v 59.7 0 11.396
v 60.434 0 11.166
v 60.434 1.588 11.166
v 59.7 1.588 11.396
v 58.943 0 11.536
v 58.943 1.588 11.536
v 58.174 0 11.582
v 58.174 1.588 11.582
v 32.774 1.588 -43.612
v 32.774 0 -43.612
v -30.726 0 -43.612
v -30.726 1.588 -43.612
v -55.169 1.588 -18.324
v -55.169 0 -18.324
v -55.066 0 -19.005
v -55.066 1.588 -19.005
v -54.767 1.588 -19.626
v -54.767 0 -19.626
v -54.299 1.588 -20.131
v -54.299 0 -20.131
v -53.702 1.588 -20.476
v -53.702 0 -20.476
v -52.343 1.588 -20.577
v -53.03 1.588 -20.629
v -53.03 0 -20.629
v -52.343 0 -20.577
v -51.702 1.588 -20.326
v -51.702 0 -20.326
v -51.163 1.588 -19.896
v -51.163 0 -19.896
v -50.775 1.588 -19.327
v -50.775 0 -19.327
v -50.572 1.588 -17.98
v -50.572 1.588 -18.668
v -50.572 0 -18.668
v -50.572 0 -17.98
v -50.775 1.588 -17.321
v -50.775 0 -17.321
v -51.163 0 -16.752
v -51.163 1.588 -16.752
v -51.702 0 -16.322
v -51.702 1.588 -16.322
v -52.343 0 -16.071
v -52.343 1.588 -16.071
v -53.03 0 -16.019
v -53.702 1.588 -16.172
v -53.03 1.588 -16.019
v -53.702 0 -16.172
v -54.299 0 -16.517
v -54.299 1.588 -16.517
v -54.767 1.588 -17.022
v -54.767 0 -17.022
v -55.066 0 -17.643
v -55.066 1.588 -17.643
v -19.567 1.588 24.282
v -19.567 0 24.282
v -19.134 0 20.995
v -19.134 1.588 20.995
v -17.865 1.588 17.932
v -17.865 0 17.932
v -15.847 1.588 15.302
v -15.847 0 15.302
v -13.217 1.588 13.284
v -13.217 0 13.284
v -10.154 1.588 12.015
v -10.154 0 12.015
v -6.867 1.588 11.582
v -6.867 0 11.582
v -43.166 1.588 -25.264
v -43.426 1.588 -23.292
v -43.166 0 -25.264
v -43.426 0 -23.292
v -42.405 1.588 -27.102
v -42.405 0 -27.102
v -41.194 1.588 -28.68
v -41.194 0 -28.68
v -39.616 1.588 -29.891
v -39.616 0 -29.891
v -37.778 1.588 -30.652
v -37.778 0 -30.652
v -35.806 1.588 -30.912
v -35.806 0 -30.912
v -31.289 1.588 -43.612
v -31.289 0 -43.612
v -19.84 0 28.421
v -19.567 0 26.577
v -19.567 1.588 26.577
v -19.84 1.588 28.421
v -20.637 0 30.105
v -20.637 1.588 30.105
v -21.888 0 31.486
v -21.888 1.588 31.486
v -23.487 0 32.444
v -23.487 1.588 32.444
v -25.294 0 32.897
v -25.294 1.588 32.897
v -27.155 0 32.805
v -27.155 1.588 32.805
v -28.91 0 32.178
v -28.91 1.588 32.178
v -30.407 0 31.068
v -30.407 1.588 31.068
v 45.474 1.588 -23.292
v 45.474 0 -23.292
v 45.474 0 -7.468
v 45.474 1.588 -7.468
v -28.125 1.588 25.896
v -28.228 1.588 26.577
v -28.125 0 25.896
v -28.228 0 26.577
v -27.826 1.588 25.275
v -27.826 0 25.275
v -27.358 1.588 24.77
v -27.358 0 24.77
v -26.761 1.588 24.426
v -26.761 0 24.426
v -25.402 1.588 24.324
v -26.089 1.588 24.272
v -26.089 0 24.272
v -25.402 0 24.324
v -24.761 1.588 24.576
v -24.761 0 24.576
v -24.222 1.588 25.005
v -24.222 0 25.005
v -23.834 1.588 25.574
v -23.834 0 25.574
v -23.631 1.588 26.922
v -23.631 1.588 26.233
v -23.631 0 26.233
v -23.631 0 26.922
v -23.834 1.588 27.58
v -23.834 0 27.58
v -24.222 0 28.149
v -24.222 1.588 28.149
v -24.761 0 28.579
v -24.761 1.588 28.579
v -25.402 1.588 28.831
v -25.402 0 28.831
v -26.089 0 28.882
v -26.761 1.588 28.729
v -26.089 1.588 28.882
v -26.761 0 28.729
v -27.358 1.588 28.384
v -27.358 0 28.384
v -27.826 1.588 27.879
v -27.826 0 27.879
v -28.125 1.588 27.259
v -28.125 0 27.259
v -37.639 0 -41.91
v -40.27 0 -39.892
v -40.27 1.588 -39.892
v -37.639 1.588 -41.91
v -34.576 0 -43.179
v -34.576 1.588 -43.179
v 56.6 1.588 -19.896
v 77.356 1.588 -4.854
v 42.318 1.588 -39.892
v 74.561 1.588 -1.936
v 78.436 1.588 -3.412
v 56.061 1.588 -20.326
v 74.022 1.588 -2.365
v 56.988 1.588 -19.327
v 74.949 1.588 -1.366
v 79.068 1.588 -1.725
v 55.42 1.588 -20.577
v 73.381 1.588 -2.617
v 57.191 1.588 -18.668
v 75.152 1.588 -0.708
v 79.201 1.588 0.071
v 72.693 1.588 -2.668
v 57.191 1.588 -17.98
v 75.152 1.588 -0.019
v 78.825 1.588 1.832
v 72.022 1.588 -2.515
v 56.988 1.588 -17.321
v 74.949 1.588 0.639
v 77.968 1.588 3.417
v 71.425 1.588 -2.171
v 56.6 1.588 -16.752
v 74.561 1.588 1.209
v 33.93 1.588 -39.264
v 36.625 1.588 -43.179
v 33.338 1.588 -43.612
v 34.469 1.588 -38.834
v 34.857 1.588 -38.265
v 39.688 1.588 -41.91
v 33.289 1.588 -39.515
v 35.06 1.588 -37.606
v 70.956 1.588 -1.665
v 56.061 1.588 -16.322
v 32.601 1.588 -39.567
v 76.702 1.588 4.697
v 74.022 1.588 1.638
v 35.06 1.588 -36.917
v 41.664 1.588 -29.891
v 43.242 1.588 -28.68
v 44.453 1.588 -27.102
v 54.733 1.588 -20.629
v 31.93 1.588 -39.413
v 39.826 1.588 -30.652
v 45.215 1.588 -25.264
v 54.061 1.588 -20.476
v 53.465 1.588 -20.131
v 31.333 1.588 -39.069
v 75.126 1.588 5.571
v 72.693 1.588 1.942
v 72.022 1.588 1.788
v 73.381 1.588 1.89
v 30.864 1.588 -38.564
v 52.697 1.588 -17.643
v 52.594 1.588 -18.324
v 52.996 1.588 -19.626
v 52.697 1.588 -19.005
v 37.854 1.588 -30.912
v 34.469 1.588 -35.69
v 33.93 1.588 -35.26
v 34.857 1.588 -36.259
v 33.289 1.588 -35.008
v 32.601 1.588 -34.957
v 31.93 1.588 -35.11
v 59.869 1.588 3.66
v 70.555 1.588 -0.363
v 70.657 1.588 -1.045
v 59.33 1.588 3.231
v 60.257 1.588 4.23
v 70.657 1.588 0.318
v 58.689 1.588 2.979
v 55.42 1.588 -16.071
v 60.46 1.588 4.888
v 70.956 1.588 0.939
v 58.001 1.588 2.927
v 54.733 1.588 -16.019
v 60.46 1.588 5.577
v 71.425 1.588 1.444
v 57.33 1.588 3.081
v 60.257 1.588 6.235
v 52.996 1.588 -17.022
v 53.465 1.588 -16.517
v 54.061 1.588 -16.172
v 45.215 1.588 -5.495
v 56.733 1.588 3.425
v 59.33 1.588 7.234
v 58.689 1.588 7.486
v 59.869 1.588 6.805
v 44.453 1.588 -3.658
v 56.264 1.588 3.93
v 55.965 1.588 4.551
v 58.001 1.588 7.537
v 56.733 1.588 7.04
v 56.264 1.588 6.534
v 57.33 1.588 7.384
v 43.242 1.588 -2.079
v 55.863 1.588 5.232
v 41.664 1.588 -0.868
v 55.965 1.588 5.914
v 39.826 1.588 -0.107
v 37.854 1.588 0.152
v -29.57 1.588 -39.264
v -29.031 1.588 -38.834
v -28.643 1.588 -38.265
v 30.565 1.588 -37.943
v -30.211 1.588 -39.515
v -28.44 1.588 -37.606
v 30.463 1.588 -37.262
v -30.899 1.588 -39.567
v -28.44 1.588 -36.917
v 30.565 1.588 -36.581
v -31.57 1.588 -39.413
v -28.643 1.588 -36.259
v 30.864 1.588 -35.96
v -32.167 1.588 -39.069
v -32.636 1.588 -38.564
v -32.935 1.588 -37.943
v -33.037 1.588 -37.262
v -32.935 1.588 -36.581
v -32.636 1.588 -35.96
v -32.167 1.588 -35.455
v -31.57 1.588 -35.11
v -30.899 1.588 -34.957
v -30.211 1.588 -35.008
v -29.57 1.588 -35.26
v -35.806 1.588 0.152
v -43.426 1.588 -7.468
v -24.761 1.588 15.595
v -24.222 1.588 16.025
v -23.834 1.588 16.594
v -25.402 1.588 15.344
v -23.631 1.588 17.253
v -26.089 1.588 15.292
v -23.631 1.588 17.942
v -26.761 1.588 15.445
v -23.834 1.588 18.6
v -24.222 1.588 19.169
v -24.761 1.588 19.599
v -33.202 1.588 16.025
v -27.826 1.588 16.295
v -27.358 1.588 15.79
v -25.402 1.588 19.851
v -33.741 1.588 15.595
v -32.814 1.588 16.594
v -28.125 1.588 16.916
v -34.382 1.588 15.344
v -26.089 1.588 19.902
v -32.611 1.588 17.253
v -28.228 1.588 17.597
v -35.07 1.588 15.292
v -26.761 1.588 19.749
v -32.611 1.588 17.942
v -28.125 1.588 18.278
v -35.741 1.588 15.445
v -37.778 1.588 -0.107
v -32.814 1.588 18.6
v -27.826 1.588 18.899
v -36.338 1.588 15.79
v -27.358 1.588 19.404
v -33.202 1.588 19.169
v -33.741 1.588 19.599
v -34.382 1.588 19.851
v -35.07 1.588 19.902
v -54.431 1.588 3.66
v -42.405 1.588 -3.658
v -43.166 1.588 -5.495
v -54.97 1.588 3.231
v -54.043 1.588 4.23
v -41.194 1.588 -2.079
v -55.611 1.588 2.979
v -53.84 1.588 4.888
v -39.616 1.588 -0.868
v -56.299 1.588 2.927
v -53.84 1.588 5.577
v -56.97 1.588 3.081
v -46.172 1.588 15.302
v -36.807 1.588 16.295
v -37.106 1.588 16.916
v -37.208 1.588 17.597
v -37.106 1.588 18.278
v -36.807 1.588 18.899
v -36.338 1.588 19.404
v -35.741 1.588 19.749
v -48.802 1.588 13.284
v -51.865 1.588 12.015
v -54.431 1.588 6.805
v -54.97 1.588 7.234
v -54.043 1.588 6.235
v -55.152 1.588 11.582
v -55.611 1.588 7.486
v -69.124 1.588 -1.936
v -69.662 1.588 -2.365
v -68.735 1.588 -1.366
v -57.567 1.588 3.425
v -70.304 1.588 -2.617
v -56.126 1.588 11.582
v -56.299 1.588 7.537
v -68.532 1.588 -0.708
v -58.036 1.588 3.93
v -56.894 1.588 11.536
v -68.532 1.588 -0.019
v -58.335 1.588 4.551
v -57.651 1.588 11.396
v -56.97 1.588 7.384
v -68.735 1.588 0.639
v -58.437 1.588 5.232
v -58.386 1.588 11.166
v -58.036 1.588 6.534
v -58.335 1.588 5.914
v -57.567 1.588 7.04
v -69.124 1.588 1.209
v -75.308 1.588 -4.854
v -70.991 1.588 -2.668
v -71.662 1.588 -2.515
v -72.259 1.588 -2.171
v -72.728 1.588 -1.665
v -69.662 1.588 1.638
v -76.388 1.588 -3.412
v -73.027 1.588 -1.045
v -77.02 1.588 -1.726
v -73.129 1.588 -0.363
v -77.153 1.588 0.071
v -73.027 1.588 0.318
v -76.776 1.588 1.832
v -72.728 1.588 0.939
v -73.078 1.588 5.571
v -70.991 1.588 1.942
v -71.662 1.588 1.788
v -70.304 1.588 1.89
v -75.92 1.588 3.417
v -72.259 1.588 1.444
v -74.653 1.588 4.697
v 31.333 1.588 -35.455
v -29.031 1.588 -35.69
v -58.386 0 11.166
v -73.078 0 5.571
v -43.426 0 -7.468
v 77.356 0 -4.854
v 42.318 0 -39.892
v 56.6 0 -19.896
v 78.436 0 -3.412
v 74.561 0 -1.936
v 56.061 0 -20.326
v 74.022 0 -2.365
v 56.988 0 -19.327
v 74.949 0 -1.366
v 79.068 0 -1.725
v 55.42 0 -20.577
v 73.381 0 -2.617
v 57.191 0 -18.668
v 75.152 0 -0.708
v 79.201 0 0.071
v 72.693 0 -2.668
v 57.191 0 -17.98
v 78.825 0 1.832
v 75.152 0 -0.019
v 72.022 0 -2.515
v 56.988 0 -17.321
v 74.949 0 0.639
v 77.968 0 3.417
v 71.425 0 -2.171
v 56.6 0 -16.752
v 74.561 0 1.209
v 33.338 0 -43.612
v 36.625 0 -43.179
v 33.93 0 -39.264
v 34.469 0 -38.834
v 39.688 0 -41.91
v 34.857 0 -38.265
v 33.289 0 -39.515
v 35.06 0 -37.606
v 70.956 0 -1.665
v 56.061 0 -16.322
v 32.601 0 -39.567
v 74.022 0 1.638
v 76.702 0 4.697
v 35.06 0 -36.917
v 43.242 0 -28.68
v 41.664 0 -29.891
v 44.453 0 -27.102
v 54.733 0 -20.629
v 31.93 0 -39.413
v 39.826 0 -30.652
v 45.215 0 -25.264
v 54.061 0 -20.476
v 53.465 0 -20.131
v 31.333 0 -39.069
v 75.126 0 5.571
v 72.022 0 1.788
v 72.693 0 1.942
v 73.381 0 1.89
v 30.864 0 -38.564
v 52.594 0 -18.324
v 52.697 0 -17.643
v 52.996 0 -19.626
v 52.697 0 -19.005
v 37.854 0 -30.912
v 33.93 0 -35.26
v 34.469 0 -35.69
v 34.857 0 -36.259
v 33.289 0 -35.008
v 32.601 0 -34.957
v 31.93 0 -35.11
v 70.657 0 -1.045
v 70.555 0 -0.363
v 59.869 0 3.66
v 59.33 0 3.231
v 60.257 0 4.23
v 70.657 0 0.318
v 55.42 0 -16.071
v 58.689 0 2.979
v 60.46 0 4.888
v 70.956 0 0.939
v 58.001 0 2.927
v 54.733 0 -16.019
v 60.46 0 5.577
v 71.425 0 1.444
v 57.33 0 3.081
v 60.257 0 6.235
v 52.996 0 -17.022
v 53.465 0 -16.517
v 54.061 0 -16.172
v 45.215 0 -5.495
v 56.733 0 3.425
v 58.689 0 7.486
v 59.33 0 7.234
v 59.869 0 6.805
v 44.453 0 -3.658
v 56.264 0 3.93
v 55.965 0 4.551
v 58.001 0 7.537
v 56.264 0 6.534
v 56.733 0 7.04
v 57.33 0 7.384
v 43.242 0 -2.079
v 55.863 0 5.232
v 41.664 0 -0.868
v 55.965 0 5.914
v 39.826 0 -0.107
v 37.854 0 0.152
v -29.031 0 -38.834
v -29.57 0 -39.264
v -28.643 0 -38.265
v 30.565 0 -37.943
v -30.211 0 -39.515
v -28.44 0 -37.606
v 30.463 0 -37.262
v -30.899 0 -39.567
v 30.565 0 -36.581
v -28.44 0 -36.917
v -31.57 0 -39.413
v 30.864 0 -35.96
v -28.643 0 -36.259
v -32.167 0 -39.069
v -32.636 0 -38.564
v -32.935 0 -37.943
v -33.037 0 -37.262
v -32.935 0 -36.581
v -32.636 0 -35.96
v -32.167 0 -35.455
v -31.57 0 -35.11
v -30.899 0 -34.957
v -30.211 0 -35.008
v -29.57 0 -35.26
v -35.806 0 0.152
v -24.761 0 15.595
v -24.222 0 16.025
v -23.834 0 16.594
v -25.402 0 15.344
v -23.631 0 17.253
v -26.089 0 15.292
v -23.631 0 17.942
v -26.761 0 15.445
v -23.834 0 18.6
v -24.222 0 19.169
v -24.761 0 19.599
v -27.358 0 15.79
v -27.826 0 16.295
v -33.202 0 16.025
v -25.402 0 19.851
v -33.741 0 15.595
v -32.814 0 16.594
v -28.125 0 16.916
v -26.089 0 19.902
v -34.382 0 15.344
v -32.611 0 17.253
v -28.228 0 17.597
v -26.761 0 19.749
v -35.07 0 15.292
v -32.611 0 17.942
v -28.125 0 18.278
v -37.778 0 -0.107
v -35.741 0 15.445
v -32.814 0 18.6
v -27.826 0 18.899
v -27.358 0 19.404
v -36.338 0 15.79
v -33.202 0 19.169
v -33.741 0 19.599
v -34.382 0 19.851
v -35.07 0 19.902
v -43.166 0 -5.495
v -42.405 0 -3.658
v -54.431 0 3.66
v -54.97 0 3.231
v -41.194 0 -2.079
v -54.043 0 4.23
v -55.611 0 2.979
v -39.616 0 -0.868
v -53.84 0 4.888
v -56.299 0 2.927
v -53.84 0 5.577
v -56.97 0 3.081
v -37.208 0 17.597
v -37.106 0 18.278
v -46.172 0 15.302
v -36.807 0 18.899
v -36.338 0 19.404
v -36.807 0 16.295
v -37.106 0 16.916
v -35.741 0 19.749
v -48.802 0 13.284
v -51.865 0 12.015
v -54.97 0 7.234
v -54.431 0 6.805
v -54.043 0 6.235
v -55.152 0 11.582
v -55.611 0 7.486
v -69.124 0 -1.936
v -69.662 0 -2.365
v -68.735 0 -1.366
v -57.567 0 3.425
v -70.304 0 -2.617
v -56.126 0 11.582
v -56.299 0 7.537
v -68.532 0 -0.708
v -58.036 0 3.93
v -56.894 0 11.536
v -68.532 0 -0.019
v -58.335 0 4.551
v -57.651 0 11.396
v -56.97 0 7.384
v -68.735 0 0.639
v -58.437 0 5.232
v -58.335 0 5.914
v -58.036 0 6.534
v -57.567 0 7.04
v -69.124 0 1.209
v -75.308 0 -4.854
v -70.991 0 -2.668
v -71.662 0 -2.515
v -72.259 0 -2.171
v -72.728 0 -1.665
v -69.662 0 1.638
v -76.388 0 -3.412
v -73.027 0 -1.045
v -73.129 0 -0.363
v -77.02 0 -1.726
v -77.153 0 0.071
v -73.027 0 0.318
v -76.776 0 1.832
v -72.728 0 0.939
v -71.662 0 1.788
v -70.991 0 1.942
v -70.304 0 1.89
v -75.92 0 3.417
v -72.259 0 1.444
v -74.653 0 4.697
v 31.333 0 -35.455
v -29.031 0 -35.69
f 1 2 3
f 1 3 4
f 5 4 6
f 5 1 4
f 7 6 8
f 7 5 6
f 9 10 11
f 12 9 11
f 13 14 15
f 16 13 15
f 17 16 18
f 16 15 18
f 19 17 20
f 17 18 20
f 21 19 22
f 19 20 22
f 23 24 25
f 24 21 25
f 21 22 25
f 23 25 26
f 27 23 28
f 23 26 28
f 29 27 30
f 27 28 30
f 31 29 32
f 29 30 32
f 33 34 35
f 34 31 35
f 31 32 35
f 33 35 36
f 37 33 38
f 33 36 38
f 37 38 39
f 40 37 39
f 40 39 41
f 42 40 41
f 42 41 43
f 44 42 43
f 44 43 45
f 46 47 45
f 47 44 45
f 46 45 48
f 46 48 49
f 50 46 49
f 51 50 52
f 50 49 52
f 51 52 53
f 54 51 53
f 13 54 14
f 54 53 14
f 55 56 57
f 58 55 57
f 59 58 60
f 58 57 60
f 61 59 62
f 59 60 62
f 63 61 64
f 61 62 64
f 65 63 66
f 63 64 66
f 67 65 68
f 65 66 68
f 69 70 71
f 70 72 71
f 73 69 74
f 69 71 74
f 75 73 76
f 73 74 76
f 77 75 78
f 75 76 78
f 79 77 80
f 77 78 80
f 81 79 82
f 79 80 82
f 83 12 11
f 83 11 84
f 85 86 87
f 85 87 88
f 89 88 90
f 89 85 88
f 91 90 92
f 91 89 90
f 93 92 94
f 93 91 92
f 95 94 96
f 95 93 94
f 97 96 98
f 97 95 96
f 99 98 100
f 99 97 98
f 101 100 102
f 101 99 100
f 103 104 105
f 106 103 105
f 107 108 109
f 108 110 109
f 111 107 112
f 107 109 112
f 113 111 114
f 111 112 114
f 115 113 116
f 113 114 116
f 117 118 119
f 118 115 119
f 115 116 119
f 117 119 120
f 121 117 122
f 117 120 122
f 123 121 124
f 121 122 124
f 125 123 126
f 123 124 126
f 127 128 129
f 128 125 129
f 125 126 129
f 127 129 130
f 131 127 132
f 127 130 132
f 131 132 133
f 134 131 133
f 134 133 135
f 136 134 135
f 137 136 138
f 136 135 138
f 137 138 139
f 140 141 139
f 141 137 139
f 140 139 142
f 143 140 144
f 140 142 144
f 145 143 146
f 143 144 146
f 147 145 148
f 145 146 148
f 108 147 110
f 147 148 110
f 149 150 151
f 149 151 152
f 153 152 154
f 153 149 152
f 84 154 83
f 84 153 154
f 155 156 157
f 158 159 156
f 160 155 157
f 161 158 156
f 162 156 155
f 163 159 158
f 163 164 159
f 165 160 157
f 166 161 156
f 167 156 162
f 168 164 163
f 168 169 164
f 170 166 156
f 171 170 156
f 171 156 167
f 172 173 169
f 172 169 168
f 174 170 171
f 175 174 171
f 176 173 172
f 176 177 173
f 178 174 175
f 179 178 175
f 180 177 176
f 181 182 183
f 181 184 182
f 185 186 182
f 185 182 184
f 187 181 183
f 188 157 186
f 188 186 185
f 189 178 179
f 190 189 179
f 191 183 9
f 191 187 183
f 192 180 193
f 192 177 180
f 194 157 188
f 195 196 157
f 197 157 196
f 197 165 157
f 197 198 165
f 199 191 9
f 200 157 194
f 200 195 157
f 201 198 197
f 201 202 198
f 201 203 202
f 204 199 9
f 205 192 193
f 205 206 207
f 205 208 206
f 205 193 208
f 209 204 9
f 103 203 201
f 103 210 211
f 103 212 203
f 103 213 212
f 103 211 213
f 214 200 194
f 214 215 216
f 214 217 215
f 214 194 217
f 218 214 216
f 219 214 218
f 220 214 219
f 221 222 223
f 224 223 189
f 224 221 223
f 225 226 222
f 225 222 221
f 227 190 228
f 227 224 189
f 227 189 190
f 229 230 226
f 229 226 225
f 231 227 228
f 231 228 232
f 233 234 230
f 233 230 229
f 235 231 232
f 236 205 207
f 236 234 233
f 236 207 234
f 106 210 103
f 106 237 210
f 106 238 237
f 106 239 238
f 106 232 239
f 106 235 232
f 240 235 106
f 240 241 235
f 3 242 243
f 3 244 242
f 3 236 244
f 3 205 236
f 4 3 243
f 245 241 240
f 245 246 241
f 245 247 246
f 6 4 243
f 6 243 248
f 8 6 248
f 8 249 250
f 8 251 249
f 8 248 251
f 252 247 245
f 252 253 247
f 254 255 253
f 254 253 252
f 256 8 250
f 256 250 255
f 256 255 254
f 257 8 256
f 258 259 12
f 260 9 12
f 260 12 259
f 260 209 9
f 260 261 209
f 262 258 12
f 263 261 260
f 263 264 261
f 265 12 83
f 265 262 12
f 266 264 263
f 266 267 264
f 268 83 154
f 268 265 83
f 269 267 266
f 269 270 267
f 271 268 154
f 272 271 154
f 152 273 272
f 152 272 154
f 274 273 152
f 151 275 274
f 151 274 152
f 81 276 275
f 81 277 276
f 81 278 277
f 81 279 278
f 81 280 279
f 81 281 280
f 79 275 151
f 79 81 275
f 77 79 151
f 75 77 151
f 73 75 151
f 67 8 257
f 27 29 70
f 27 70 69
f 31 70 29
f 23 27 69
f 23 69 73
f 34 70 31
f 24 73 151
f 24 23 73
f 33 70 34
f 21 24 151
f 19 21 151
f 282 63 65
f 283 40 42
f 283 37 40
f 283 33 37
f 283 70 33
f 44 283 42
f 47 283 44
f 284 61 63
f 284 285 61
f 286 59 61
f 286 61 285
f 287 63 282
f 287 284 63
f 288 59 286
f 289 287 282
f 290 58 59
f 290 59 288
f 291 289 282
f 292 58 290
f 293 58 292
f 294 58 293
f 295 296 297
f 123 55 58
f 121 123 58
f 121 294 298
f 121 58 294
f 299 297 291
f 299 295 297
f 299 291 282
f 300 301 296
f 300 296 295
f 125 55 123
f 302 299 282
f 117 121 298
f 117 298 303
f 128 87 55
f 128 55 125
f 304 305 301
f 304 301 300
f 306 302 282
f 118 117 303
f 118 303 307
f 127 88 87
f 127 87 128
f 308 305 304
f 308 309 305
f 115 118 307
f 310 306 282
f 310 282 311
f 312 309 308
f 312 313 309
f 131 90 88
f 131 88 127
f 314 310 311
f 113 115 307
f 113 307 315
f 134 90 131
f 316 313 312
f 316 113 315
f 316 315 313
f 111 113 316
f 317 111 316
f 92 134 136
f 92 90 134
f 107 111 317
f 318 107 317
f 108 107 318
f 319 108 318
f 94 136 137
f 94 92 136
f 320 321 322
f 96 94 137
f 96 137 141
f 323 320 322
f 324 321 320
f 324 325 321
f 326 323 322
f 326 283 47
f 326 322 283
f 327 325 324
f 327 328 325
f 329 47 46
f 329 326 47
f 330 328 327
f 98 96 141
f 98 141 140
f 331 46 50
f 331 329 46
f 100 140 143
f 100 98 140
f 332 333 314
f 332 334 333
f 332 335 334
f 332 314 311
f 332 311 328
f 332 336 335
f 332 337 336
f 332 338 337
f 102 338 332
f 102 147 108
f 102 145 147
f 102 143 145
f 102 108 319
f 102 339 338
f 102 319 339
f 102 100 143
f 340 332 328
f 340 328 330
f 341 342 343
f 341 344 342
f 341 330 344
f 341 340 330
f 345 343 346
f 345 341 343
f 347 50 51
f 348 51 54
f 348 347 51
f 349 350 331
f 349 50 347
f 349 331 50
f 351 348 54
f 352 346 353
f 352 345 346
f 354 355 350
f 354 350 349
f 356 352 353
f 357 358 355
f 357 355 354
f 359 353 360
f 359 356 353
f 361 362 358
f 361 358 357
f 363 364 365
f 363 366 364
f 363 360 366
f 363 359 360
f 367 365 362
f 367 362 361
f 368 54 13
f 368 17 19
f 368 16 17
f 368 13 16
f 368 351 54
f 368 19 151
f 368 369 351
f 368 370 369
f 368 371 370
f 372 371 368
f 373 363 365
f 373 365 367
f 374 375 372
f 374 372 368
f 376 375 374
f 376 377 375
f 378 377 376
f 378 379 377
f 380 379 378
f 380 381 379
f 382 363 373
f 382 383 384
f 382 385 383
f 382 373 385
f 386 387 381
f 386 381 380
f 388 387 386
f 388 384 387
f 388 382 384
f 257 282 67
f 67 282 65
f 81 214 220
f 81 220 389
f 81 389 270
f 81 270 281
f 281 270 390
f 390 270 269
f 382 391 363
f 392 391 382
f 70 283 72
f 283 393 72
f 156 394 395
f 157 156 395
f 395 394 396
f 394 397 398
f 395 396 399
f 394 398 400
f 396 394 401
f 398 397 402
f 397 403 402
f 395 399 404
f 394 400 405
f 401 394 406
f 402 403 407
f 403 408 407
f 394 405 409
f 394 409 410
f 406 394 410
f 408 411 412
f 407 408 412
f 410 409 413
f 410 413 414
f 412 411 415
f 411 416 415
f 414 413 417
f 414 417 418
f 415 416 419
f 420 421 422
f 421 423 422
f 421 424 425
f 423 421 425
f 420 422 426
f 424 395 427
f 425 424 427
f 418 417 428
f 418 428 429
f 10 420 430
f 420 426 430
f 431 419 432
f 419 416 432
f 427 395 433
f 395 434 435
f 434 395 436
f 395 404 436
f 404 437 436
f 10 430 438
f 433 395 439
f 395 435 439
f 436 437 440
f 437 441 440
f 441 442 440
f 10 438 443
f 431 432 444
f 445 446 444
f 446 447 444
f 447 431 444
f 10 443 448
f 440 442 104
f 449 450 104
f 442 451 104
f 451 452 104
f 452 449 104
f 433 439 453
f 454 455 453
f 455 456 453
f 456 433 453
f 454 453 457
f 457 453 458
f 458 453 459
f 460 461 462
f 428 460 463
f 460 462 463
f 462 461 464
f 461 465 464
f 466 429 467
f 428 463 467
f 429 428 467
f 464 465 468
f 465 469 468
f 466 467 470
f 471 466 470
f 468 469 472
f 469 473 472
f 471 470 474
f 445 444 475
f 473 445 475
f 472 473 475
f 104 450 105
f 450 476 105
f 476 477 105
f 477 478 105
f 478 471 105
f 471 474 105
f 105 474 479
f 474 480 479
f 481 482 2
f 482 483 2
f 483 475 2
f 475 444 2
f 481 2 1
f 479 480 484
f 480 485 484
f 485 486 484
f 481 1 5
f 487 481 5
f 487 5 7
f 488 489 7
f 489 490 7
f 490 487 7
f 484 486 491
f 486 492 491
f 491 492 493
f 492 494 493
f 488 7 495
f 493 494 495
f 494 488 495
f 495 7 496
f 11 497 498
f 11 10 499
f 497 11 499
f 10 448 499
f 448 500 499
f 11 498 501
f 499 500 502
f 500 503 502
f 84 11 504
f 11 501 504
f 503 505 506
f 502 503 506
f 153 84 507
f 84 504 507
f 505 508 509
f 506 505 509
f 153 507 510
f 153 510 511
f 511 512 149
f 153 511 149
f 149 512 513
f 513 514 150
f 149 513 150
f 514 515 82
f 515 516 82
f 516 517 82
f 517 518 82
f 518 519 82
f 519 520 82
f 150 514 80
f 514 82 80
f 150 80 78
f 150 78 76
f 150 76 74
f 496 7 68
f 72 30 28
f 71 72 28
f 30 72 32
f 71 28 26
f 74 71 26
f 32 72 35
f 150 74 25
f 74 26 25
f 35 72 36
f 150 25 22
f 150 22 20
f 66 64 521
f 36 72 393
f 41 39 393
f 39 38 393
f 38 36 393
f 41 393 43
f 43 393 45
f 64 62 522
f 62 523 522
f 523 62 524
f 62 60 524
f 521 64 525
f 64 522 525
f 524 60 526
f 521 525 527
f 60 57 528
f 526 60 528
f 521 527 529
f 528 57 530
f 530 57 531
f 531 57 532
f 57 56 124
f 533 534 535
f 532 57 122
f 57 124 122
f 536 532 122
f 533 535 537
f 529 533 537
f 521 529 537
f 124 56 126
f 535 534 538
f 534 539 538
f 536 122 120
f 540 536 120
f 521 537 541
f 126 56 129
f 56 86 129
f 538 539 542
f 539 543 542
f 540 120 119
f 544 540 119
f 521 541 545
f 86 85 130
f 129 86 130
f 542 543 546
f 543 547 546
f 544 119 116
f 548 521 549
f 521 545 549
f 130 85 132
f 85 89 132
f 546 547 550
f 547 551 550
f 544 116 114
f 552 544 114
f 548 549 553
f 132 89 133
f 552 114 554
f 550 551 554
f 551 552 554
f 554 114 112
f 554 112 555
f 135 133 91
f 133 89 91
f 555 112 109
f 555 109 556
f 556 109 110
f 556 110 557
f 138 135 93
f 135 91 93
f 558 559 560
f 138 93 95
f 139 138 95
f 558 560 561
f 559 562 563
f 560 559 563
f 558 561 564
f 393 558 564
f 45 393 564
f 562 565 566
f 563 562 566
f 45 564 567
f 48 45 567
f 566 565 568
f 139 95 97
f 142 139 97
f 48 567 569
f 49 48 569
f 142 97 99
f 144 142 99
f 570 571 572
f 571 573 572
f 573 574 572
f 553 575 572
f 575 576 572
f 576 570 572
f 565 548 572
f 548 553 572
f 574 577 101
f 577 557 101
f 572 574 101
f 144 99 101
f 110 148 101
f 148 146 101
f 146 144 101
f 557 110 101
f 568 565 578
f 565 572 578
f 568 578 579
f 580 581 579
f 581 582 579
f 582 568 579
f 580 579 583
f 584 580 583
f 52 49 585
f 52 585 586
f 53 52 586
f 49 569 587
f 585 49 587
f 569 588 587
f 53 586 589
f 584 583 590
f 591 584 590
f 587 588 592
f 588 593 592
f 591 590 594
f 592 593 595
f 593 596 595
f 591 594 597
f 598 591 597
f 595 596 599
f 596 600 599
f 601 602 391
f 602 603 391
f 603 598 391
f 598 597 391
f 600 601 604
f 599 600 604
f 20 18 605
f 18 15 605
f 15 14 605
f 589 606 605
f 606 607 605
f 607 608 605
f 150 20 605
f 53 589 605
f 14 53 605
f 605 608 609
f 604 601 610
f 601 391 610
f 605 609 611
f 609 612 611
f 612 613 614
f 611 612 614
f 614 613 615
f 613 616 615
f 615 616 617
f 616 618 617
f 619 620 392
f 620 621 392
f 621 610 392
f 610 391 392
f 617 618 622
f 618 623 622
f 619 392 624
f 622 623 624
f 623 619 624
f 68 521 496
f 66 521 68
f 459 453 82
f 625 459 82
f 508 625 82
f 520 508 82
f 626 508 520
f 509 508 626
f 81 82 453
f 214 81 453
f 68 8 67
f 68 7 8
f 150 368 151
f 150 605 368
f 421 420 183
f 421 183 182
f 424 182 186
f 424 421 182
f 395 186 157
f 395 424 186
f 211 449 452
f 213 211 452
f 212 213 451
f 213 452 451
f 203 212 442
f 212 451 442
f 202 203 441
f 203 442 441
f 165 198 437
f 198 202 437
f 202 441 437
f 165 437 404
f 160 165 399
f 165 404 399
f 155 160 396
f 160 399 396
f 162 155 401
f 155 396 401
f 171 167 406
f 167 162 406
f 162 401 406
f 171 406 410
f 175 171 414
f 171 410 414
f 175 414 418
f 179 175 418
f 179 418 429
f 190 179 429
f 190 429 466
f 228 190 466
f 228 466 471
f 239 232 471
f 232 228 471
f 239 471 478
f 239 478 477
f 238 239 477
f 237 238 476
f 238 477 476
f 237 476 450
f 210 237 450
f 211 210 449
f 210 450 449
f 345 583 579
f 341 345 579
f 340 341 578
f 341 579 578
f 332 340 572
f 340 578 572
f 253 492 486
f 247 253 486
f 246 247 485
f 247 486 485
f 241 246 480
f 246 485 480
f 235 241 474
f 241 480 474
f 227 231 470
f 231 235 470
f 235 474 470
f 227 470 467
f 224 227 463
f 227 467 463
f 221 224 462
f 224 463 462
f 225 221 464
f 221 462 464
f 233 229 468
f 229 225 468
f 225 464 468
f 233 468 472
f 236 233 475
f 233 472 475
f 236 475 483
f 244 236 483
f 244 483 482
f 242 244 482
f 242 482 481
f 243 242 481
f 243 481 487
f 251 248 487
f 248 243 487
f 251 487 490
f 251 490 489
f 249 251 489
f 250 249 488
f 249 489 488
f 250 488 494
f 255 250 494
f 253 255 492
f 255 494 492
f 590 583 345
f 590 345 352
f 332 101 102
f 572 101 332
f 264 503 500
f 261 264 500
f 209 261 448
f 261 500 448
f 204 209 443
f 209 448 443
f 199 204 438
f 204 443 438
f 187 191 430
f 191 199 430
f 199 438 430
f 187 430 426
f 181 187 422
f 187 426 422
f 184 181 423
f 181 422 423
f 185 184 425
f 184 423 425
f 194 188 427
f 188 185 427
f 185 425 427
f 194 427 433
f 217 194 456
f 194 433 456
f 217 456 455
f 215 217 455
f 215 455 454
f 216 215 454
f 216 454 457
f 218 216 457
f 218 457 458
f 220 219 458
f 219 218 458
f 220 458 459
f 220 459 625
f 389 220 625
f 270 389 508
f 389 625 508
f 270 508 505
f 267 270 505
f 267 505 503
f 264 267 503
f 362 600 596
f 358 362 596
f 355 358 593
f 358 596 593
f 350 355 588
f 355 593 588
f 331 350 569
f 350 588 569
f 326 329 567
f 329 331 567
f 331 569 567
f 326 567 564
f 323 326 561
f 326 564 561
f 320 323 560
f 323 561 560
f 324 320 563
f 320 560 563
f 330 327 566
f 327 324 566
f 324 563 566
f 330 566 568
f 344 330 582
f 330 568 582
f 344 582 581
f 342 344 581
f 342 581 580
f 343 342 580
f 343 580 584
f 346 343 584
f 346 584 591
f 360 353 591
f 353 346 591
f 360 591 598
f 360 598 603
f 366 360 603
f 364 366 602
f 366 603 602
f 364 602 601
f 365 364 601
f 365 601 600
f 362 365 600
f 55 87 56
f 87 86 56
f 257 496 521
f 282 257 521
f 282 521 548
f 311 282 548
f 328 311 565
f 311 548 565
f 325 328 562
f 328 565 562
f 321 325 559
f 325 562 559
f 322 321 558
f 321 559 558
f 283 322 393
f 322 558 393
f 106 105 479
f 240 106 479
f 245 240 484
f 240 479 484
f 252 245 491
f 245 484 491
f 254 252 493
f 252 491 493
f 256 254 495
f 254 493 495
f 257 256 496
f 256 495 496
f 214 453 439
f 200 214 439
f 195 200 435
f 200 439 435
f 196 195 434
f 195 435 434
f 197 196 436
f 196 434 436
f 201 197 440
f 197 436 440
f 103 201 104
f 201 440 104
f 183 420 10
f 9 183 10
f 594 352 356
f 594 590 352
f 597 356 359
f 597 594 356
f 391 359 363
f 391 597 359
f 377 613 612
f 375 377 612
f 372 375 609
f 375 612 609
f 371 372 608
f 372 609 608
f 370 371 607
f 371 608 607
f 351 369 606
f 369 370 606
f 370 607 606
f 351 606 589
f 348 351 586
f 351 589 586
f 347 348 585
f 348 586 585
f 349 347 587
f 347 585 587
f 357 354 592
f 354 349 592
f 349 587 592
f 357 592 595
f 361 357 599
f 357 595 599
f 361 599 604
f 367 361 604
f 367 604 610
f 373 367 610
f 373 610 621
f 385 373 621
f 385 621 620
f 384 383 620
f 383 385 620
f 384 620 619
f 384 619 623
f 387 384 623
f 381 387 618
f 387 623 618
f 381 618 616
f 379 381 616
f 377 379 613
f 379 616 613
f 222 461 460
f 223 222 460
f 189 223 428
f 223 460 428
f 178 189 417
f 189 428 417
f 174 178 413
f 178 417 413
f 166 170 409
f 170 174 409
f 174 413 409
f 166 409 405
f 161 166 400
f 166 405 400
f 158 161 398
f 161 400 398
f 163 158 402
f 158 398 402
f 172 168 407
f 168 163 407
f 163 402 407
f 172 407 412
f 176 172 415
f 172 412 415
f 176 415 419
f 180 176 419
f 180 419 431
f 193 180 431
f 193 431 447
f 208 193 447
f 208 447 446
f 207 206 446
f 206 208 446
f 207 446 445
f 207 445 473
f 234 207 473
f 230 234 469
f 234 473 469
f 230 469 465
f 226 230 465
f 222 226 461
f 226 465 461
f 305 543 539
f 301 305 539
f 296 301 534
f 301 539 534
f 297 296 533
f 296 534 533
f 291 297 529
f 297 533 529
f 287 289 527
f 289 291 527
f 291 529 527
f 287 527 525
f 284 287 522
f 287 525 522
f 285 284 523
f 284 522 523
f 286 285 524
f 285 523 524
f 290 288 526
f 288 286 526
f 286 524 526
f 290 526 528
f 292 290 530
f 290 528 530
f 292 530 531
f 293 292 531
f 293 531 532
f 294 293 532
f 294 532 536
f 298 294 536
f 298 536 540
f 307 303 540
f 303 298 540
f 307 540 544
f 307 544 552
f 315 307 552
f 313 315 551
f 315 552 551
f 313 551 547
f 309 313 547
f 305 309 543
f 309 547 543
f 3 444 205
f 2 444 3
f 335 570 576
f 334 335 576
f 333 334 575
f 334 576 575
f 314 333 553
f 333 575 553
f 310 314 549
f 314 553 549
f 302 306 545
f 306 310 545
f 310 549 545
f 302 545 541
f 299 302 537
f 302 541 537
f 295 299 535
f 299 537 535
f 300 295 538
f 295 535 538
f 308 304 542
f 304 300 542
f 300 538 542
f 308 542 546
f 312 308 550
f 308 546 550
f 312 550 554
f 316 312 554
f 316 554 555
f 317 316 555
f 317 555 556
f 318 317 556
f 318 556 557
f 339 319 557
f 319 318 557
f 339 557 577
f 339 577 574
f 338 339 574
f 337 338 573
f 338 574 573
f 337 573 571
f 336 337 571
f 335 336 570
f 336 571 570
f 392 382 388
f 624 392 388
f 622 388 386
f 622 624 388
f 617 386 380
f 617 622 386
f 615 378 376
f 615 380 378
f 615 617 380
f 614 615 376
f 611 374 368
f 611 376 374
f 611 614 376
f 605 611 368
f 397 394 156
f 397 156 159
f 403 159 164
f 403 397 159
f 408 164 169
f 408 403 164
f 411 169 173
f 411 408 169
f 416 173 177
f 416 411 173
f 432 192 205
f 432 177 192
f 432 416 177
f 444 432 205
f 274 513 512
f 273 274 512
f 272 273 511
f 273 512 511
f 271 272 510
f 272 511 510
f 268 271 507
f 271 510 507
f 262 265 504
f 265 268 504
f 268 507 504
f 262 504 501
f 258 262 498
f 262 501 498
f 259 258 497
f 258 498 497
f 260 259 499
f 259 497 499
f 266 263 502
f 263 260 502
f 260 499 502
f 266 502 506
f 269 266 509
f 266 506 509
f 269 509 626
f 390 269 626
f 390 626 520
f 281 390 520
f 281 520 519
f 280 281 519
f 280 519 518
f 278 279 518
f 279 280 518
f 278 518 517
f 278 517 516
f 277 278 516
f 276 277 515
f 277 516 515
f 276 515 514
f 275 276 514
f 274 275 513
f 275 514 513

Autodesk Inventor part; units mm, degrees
ref_plane "YZ Plane" through (0, 0, 0) normal (1, 0, 0) x (0, 1, 0)
ref_plane "XZ Plane" through (0, 0, 0) normal (0, 1, 0) x (-1, 0, 0)
ref_plane "XY Plane" through (0, 0, 0) normal (0, 0, 1) x (1, 0, 0)
sketch "Sketch1" plane through (0, 0, 0) normal (0, 1, 0) x (-1, 0, 0)
  line L0 (-37.8542, 0.1524) -> (35.8058, 0.1524)
  line L1 (43.4258, -7.4676) -> (43.4258, -23.2918)
  line L2 (35.8058, -30.9118) -> (-37.8542, -30.9118)
  line L3 (-45.4742, -23.2918) -> (-45.4742, -7.4676)
  arc A0 (-37.8542, 0.1524) -> (-45.4742, -7.4676) centre (-37.8542, -7.4676) ccw
  arc A1 (-45.4742, -23.2918) -> (-37.8542, -30.9118) centre (-37.8542, -23.2918) ccw
  arc A2 (35.8058, -30.9118) -> (43.4258, -23.2918) centre (35.8058, -23.2918) ccw
  arc A3 (43.4258, -7.4676) -> (35.8058, 0.1524) centre (35.8058, -7.4676) ccw
  circle A4 centre (-72.8662, -0.3634) radius 2.3114
  circle A5 centre (-54.9057, -18.324) radius 2.3114
  circle A6 centre (-58.1742, 5.2324) radius 2.3114
  circle A7 centre (56.1258, 5.2324) radius 2.3114
  circle A8 centre (-32.7742, -37.2618) radius 2.3114
  circle A9 centre (30.7258, -37.2618) radius 2.3114
  circle A10 centre (52.8574, -18.324) radius 2.3114
  circle A11 centre (70.8179, -0.3634) radius 2.3114
  circle A12 centre (34.8968, 17.5971) radius 2.3114
  circle A13 centre (25.9166, 26.5773) radius 2.3114
  circle A14 centre (25.9166, 17.5971) radius 2.3114
  arc A15 (75.308, -4.8536) -> (73.078, 5.5707) centre (70.8179, -0.3634) ccw
  arc A16 (58.386, 11.1665) -> (56.1258, 11.5824) centre (56.1258, 5.2324) ccw
  arc A17 (30.4067, 31.0675) -> (19.5666, 26.5773) centre (25.9166, 26.5773) ccw
  arc A18 (30.7258, -43.6118) -> (30.9592, -43.6075) centre (30.7258, -37.2618) ccw
  arc A19 (-75.1264, 5.5707) -> (-77.3564, -4.8536) centre (-72.8662, -0.3634) ccw
  arc A20 (-32.7742, -43.6118) -> (-31.4271, -43.4673) centre (-32.7742, -37.2618) ccw
  arc A21 (-58.1742, 11.5824) -> (-60.4344, 11.1665) centre (-58.1742, 5.2324) ccw
  line L4 (-75.1264, 5.5707) -> (-60.4344, 11.1665)
  line L5 (-77.3564, -4.8536) -> (-42.3179, -39.8921)
  line L6 (-33.3376, -43.6118) -> (31.2893, -43.6118)
  line L7 (75.308, -4.8536) -> (40.2695, -39.8921)
  line L8 (58.386, 11.1665) -> (73.078, 5.5707)
  line L9 (19.5666, 26.5773) -> (19.5666, 24.2824)
  line L10 (30.4067, 31.0675) -> (46.172, 15.3021)
  line L11 (55.1523, 11.5824) -> (56.1258, 11.5824)
  line L12 (-58.1742, 11.5824) -> (6.8666, 11.5824)
  arc A22 (-42.3179, -39.8921) -> (-33.3376, -43.6118) centre (-33.3376, -30.9118) ccw
  arc A23 (31.2893, -43.6118) -> (40.2695, -39.8921) centre (31.2893, -30.9118) ccw
  arc A24 (46.172, 15.3021) -> (55.1523, 11.5824) centre (55.1523, 24.2824) ccw
  arc A25 (6.8666, 11.5824) -> (19.5666, 24.2824) centre (6.8666, 24.2824) ccw
  point P0 (0, 0)
  point P1 (43.4258, -30.9118)
  point P2 (43.4258, 0.1524)
  point P3 (-45.4742, -30.9118)
  point P4 (43.4258, -30.9118)
  dimension "d2" = 7.62
  dimension "d20" = 12.7
extrude "Extrusion1" add sketch "Sketch1" along normal blind 1.5875
properties part number "gusset-2-3.25-fulll-brace"
